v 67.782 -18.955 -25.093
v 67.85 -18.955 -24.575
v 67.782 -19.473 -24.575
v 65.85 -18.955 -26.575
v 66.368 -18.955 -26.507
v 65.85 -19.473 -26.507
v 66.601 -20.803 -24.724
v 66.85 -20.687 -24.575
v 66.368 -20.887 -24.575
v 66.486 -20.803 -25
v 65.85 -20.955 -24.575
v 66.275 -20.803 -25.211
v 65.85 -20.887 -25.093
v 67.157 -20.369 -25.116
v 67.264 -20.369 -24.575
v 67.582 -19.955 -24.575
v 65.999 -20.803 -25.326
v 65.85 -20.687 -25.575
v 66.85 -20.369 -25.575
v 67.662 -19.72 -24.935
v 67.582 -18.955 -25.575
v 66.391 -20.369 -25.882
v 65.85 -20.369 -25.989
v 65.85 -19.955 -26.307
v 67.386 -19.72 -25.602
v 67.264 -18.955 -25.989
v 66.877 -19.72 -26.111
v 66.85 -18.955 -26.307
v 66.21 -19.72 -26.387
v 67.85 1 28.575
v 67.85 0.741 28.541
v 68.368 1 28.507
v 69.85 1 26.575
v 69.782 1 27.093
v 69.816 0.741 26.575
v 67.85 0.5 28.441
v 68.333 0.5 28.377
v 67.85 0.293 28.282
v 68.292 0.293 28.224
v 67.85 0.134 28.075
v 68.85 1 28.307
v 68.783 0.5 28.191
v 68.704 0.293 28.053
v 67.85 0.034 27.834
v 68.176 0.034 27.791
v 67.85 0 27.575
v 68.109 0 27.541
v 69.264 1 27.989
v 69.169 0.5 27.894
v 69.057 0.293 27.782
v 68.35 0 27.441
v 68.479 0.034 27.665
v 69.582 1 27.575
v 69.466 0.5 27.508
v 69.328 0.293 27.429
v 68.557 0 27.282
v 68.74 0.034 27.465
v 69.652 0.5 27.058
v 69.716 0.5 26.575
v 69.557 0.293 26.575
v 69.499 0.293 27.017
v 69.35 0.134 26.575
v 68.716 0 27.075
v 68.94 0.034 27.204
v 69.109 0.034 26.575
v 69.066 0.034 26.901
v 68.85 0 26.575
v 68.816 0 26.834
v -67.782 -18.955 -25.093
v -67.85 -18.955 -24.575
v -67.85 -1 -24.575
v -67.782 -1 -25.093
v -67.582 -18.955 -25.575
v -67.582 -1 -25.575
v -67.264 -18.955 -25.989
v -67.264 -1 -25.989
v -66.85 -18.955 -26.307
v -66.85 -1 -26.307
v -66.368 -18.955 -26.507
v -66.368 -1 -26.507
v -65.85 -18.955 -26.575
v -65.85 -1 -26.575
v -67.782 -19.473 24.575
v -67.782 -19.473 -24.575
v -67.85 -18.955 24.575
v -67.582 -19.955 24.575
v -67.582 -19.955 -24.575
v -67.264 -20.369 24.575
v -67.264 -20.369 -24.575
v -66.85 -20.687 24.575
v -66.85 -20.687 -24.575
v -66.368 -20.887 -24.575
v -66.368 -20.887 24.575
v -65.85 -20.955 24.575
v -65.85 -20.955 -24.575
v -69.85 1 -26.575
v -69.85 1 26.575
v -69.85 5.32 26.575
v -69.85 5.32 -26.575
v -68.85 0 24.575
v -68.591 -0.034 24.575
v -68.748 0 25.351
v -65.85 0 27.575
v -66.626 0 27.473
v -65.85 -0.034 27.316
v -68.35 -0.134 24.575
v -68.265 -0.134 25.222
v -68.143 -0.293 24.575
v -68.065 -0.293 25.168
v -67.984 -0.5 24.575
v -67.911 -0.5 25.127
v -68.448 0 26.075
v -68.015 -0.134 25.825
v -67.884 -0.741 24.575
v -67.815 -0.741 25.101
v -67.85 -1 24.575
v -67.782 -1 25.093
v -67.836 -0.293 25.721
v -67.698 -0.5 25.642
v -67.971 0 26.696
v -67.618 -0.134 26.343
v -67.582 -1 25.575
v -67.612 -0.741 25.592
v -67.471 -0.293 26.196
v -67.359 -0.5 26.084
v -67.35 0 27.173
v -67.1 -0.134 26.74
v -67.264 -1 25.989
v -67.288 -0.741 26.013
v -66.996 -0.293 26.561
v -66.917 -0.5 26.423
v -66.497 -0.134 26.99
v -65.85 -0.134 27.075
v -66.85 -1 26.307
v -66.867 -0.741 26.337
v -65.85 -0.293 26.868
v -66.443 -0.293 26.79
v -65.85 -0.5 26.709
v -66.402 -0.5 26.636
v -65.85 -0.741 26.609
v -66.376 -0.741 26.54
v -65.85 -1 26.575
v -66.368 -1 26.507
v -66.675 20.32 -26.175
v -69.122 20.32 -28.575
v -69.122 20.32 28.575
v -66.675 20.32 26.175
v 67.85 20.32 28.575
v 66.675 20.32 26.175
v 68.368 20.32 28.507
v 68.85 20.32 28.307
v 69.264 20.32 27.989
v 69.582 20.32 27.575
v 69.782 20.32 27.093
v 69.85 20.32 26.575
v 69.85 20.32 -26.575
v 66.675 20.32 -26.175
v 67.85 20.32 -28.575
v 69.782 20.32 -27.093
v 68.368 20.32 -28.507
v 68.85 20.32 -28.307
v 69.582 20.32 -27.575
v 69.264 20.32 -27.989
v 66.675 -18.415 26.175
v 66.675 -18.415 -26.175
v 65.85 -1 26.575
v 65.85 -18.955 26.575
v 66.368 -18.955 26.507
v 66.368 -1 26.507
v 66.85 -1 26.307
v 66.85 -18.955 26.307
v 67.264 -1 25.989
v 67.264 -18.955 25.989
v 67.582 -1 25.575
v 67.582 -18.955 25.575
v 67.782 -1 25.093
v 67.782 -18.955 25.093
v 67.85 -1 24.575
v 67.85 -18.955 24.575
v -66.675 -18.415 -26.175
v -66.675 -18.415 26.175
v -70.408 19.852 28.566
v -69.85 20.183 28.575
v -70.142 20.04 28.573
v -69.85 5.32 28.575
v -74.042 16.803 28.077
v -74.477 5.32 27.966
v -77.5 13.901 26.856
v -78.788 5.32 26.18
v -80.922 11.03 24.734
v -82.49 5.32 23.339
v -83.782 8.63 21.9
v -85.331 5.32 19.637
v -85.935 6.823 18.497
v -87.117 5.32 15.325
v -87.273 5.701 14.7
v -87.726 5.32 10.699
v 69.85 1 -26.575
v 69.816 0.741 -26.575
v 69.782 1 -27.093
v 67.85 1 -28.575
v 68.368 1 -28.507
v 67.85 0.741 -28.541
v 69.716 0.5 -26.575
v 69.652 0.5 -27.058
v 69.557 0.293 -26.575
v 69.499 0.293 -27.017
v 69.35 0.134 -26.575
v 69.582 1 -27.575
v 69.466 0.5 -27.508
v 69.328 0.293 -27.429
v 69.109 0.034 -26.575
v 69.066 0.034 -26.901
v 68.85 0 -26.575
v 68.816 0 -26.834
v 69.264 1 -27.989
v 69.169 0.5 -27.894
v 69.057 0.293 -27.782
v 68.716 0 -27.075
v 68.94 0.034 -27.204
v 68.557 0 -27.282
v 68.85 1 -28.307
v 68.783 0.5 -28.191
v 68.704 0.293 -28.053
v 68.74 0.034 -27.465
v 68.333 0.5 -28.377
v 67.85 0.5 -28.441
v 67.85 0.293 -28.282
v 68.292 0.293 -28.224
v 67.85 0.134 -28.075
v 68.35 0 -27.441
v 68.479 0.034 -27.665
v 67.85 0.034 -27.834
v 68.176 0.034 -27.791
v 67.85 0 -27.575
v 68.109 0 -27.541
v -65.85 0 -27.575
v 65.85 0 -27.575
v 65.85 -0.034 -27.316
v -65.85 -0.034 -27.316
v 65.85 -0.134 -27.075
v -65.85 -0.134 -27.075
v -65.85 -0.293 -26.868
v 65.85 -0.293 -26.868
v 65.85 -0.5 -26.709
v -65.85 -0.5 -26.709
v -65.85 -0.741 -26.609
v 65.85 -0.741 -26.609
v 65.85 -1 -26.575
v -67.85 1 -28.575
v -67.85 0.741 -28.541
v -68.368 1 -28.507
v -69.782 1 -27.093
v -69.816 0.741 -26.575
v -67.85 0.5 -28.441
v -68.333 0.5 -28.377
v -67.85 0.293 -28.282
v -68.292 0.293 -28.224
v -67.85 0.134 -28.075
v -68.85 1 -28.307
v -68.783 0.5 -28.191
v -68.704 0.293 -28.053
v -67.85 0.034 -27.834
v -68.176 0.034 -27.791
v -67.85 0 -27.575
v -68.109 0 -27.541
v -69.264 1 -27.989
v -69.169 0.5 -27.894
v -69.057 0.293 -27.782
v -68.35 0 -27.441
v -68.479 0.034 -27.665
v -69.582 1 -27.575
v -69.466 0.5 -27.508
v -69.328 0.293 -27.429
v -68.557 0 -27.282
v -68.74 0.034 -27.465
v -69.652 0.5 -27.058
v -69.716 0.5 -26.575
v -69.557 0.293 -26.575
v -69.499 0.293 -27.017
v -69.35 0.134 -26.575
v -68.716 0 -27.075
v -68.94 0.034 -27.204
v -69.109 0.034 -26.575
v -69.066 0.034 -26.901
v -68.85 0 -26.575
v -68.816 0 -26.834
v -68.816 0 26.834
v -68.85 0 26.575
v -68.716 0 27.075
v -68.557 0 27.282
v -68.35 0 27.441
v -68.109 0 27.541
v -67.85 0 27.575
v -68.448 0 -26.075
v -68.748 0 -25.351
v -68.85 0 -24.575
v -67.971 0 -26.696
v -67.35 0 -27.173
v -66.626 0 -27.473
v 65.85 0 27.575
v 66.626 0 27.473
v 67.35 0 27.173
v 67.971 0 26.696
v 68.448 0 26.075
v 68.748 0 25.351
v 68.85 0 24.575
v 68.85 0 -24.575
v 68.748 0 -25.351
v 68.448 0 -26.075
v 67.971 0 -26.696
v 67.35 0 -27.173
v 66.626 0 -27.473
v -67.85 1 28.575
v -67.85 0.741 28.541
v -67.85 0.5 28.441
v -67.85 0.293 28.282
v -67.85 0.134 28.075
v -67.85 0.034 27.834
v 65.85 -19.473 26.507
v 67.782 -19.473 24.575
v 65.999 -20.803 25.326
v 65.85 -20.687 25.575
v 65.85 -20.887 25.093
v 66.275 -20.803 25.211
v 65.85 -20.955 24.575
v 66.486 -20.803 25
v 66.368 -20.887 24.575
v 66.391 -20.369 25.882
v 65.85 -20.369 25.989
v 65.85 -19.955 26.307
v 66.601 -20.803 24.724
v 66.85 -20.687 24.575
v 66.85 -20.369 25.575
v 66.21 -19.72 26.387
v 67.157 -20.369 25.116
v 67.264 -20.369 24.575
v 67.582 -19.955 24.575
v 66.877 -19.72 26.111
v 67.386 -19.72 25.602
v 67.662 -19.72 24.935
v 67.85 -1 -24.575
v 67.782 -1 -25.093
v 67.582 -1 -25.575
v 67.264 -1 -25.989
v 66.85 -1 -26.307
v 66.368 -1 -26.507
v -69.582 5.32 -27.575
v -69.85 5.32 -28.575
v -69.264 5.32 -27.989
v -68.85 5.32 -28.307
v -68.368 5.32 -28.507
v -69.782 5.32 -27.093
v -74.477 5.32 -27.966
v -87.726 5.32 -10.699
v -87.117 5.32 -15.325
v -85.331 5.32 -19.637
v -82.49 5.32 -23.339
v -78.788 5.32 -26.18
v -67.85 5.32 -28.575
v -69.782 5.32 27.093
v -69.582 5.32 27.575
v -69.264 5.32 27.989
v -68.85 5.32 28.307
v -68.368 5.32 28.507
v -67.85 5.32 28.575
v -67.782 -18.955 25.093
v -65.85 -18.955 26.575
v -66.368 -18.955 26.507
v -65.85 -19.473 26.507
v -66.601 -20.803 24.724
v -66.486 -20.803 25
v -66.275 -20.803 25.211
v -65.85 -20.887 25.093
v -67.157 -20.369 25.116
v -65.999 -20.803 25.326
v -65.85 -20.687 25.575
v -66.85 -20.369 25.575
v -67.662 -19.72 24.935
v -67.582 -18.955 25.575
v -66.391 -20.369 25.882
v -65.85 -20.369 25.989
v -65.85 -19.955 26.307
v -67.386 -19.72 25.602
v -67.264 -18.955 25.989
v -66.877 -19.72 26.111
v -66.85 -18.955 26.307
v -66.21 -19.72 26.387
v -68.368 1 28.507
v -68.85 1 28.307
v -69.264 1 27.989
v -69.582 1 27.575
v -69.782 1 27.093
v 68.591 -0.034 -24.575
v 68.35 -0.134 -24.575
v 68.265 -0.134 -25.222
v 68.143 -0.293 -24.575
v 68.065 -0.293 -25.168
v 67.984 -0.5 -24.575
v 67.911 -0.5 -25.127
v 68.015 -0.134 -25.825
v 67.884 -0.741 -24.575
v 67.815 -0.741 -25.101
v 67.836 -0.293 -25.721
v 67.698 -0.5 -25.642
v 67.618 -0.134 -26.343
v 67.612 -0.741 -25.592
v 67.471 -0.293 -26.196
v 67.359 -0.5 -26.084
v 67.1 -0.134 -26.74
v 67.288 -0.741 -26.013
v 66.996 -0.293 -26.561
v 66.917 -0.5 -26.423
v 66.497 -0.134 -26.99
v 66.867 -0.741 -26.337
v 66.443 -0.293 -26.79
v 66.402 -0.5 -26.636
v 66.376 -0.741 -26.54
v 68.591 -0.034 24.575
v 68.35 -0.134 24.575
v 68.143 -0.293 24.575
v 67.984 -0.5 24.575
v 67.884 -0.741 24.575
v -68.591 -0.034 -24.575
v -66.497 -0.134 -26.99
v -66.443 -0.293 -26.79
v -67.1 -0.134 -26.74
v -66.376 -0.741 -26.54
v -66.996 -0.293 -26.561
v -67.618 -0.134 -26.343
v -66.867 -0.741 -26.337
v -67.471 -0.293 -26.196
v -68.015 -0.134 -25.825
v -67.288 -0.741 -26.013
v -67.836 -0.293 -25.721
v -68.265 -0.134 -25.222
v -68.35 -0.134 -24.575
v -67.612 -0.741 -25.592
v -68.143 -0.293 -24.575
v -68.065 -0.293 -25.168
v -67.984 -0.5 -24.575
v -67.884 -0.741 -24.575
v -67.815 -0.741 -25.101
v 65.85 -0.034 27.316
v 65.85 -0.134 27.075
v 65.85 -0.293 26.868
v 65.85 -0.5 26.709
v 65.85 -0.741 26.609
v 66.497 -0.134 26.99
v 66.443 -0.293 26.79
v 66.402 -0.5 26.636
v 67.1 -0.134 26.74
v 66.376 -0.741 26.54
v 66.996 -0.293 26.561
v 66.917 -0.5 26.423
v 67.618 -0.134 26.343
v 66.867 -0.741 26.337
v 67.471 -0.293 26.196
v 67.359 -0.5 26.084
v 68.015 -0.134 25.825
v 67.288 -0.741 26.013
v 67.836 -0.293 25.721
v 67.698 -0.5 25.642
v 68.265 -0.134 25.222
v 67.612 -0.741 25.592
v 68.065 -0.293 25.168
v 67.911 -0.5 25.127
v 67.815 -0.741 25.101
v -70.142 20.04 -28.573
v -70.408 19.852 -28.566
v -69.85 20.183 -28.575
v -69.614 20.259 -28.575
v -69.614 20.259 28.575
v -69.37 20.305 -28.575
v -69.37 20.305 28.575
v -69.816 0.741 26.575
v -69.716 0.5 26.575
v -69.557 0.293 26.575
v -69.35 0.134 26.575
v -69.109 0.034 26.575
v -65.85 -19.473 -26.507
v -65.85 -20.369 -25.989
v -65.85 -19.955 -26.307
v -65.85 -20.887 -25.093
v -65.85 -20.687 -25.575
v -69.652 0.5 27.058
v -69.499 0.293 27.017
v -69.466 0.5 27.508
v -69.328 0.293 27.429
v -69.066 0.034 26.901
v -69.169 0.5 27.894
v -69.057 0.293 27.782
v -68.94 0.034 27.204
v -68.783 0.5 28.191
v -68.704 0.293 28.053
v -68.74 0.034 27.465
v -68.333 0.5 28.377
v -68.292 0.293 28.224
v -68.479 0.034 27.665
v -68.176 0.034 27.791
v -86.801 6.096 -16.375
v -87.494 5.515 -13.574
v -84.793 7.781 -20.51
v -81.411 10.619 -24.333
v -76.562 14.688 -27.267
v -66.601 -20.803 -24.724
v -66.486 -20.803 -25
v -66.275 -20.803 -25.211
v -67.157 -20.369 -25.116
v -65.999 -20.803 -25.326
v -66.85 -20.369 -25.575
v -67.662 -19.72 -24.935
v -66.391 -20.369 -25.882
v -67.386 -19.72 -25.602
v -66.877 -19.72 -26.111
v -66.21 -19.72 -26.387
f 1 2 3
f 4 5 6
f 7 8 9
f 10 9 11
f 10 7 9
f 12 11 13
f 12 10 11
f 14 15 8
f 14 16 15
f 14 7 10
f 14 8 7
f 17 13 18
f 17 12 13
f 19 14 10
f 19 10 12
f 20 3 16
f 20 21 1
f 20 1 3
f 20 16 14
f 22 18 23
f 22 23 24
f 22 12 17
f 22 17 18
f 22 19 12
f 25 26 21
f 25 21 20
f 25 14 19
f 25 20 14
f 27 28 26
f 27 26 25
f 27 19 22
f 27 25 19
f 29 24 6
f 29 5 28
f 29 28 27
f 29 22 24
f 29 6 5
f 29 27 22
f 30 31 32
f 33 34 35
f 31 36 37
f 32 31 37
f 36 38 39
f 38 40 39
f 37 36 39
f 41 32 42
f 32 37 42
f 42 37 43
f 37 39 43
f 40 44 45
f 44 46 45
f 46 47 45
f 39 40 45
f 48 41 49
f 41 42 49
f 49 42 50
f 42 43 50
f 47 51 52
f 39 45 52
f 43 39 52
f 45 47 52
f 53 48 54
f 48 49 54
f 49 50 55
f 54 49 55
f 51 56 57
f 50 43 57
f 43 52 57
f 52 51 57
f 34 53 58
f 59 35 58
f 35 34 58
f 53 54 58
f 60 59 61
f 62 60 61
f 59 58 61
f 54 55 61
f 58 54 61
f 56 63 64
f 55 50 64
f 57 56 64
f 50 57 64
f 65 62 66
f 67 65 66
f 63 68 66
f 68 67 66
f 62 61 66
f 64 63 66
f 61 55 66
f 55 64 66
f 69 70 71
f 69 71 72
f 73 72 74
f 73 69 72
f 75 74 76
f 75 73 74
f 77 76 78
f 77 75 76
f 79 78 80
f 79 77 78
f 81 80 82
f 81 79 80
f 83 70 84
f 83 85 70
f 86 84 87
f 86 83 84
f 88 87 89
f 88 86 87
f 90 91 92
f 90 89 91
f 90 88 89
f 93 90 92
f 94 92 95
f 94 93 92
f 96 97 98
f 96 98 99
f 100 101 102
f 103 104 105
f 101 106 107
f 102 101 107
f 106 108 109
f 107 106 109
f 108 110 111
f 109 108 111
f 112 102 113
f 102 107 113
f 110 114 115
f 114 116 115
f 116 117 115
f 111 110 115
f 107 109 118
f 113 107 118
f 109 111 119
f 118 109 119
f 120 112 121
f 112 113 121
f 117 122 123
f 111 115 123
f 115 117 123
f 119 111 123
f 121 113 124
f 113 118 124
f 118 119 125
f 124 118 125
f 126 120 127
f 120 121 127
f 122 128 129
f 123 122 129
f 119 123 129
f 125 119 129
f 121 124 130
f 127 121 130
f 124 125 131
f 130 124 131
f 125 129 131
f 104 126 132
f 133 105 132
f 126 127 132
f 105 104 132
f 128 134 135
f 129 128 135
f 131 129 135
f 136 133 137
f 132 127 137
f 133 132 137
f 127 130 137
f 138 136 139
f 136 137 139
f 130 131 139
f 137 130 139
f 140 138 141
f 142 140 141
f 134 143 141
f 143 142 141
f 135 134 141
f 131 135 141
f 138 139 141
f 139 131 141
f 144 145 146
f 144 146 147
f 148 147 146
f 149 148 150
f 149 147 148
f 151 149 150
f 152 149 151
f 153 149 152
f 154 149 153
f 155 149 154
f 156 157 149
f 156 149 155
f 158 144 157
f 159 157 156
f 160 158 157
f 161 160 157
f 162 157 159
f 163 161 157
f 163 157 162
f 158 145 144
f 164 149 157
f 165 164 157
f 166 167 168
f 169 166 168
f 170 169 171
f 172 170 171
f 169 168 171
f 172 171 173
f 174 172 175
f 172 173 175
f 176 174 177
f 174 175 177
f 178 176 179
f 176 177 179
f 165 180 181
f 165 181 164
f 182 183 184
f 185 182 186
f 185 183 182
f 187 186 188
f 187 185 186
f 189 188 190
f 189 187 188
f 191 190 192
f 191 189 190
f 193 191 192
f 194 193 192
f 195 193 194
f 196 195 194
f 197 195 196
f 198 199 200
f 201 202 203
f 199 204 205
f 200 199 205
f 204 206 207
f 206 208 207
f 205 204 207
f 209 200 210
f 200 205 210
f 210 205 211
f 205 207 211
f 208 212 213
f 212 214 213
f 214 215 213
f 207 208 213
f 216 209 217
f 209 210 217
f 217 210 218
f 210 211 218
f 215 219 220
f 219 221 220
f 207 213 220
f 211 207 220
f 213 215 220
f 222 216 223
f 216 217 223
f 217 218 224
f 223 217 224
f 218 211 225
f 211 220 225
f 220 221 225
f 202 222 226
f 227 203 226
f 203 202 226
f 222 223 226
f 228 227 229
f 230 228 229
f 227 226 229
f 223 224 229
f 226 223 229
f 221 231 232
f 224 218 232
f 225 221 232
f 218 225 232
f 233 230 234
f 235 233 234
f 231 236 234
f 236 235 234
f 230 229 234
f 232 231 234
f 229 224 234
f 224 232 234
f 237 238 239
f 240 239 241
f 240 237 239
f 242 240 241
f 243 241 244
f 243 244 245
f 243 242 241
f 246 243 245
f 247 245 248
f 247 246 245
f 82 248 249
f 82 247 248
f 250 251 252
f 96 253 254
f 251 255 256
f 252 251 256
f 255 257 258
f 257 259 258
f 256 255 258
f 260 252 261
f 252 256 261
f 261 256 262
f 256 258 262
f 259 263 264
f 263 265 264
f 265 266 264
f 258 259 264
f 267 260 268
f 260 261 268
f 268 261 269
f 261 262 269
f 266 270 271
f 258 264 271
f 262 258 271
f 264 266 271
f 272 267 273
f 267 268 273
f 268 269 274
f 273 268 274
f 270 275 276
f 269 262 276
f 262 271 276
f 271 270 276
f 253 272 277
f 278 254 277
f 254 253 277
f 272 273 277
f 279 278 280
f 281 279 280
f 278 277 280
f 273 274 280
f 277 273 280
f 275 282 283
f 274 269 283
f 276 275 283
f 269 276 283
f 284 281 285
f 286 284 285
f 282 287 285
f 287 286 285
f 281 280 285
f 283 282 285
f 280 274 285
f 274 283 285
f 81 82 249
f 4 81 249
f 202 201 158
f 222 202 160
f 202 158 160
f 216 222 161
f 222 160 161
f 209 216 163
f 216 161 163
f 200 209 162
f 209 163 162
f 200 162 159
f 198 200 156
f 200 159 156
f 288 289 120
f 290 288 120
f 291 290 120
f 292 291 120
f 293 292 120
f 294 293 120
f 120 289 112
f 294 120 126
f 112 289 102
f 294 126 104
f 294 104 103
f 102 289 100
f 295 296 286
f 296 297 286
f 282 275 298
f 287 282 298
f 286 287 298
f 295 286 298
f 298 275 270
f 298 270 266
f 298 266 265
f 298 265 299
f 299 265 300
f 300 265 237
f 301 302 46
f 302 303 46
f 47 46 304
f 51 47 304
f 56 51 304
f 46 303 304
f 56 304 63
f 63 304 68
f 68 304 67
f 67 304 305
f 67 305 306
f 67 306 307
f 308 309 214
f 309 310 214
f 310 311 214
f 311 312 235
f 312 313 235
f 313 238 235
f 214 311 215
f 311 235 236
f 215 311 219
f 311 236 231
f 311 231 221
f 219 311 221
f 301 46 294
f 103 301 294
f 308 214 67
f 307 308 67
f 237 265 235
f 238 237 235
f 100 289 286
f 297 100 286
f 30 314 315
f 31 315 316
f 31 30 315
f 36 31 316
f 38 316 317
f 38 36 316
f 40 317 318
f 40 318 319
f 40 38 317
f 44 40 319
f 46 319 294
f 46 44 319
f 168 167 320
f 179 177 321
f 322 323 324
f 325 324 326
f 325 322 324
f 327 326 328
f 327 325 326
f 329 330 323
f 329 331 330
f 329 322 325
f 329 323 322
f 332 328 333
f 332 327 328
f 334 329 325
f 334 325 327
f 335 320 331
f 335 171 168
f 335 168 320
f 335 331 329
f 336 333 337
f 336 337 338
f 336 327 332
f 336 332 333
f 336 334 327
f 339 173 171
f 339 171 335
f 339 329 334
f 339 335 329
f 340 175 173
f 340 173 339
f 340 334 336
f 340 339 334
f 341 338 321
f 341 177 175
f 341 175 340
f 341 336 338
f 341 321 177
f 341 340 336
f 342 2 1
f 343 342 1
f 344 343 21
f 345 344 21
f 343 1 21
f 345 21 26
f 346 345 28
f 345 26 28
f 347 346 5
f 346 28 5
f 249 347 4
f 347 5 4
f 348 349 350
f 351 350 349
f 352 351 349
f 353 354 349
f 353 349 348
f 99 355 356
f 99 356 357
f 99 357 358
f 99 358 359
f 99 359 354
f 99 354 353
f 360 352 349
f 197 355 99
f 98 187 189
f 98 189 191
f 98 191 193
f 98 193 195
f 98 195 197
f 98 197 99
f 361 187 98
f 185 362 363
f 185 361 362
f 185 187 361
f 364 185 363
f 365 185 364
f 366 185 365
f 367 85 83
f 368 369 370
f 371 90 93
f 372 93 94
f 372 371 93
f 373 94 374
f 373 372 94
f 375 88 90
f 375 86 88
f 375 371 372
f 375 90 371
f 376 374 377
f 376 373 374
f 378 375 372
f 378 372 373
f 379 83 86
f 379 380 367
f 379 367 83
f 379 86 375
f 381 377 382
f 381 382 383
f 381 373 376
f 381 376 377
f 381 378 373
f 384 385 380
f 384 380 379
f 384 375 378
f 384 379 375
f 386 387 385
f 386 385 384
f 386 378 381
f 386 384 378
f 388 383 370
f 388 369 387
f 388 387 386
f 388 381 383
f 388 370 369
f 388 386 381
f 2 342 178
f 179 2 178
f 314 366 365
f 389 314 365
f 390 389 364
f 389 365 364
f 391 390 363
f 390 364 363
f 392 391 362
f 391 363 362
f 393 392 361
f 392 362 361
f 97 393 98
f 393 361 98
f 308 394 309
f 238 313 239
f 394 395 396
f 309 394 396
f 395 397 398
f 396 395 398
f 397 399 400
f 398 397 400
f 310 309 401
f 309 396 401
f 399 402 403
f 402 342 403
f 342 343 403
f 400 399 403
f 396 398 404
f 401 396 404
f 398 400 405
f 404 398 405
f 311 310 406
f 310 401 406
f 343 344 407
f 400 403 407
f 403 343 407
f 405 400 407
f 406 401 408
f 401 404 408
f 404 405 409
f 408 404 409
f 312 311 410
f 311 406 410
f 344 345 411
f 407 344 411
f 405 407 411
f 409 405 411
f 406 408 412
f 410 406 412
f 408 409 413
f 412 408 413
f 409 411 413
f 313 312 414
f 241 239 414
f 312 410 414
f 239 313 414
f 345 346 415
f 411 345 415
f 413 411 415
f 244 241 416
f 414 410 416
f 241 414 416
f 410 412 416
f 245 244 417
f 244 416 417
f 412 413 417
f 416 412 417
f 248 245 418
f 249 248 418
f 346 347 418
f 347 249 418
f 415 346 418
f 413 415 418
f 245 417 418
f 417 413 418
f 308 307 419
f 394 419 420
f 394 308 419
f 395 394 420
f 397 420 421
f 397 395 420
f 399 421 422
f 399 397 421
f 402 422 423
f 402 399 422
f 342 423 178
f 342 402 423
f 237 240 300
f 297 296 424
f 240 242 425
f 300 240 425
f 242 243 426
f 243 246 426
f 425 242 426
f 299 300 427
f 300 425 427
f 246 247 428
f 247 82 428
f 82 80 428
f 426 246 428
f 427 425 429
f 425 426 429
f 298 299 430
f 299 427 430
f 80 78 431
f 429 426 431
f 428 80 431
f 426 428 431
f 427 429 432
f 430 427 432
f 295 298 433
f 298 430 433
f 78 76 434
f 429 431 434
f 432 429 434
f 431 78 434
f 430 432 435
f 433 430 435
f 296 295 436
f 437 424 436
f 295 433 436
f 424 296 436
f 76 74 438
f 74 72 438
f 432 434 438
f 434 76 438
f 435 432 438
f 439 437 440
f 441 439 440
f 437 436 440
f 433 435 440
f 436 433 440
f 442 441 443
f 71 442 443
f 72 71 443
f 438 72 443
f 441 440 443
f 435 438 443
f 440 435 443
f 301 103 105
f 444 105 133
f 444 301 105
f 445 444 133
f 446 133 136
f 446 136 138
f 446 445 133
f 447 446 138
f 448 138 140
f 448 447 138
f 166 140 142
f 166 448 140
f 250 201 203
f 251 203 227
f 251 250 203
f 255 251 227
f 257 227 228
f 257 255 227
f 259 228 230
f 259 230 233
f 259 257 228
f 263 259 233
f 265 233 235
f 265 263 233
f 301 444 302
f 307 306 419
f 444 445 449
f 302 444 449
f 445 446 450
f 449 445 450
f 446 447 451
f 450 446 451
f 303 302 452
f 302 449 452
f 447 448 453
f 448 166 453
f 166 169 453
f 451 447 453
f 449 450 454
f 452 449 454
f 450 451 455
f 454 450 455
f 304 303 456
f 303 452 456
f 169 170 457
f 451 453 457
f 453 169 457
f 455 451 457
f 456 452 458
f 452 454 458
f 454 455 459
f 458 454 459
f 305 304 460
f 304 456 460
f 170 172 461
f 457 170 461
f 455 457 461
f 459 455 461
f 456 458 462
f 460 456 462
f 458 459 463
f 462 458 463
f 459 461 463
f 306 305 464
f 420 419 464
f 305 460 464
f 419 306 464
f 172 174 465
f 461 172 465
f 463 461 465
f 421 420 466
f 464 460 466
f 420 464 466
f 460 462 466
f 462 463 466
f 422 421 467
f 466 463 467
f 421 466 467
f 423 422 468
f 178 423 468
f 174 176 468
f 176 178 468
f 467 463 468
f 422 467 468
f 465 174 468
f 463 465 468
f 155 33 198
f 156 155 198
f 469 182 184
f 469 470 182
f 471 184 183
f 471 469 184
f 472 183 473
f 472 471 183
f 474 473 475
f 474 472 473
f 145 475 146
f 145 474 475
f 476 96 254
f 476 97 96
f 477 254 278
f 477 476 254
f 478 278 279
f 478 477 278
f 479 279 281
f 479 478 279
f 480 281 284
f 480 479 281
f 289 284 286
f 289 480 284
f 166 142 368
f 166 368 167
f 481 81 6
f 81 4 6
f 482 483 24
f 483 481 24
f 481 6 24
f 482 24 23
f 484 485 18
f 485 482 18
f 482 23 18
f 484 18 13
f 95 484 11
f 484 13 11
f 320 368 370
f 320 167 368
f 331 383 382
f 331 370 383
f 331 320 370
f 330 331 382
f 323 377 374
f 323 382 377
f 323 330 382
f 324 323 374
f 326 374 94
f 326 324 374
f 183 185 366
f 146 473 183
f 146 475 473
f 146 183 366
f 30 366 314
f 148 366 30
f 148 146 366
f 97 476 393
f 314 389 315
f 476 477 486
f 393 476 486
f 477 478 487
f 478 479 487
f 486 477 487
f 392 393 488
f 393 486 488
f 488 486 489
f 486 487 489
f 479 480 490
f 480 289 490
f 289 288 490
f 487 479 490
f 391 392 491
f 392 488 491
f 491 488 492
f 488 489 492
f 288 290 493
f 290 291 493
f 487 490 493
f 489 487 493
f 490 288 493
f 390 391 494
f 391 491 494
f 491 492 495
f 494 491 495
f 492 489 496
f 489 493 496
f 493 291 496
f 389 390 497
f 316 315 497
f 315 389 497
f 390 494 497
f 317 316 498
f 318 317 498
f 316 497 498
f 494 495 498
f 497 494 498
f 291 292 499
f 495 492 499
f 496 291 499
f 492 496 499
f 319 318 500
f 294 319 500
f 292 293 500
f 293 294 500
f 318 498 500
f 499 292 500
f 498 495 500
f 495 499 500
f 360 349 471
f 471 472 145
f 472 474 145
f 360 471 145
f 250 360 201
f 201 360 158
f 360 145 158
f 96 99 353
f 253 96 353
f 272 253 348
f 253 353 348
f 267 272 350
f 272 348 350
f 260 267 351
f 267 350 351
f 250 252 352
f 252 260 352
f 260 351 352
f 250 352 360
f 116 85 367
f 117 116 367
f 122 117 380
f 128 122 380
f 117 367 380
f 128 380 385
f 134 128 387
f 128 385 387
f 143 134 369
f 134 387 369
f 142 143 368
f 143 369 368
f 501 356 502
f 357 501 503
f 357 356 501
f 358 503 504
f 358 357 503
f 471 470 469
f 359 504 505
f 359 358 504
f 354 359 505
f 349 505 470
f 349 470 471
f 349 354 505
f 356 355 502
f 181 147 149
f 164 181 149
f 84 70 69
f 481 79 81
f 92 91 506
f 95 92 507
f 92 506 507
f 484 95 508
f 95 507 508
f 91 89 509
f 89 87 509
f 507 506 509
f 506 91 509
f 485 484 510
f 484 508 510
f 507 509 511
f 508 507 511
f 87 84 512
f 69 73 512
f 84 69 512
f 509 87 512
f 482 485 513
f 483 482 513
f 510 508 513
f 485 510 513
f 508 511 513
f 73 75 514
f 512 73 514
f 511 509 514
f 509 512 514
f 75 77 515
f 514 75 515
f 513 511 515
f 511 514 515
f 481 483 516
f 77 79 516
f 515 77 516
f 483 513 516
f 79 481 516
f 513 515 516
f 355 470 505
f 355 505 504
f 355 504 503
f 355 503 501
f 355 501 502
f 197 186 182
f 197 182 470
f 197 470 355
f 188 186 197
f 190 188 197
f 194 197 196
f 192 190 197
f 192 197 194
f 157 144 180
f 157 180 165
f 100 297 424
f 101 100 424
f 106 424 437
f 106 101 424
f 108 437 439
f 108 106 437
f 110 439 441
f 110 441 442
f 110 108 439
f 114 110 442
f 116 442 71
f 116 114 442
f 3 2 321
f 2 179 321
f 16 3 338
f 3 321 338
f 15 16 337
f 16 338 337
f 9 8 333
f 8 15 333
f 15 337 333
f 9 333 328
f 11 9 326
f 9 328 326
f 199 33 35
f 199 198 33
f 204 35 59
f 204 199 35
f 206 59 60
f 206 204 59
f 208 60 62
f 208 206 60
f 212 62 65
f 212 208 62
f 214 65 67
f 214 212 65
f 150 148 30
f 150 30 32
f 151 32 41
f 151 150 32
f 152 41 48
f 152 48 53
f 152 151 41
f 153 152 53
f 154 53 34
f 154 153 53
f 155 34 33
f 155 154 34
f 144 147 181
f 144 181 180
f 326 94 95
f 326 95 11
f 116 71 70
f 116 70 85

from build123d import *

# Parameters (mm, degrees)
SKETCH1_W           = 139.7
SKETCH1_H           = 57.15
BOSS_EXTRUDE1_DEPTH = 20.32
SKETCH2_W           = 135.7
SKETCH2_H           = 53.15
BOSS_EXTRUDE2_DEPTH = 20.955
BOSS_EXTRUDE3_DEPTH = 57.15
CUT_EXTRUDE1_DEPTH  = 96.931280842
FILLET1_R           = 2
FILLET2_R           = 1
SKETCH5_W           = 133.35
SKETCH5_H           = 52.35
CUT_EXTRUDE2_DEPTH  = 38.735


with BuildPart() as part:
    # Sketch1 → Boss-Extrude1 (new body)
    with BuildSketch(Plane(origin=(0, 0, 0), x_dir=(1, 0, 0), z_dir=(0, 1, 0))):
        Rectangle(SKETCH1_W, SKETCH1_H)
    extrude(amount=BOSS_EXTRUDE1_DEPTH)

    # Sketch2 → Boss-Extrude2 (add)
    with BuildSketch(Plane.XZ):
        Rectangle(SKETCH2_W, SKETCH2_H)
    extrude(amount=BOSS_EXTRUDE2_DEPTH)

    # Sketch3 → Boss-Extrude3 (add, through all)
    with BuildSketch(Plane.XY.offset(28.575)):
        Polygon((-69.85, 20.32), (-87.726303889, 5.32), (-69.85, 5.32), align=None)
    extrude(amount=-BOSS_EXTRUDE3_DEPTH)

    # Sketch4 → Cut-Extrude1 (cut, through all)
    with BuildSketch(Plane.XZ.offset(-5.32)):
        with BuildLine():
            Line((-69.85, -28.575), (-87.726303889, -28.575))
            Line((-87.726303889, -28.575), (-87.726303889, -10.698696111))
            ThreePointArc((-87.726303889, -10.698696111), (-82.490455702, -23.339151813), (-69.85, -28.575))
        make_face()
        with BuildLine():
            Line((-87.726303889, 10.698696111), (-87.726303889, 28.575))
            Line((-87.726303889, 28.575), (-69.85, 28.575))
            ThreePointArc((-69.85, 28.575), (-82.490455702, 23.339151813), (-87.726303889, 10.698696111))
        make_face()
    extrude(amount=-CUT_EXTRUDE1_DEPTH, mode=Mode.SUBTRACT)

    # Fillet1
    fillet1_edges = [part.edges().sort_by_distance(p)[0] for p in [
        (-69.85, 20.32, 0),
        (-69.85, 2.66, -28.575),
        (-67.85, -10.4775, -26.575),
        (69.85, 10.16, -28.575),
        (67.85, -10.4775, -26.575),
        (69.85, 10.16, 28.575),
        (67.85, -10.4775, 26.575),
        (-67.85, -10.4775, 26.575),
        (-69.85, 2.66, 28.575),
        (-67.85, -20.955, 0),
        (0, -20.955, 26.575),
        (67.85, -20.955, 0),
        (0, -20.955, -26.575),
    ]]
    fillet(fillet1_edges, radius=FILLET1_R)

    # Fillet2
    fillet2_edges = [part.edges().sort_by_distance(p)[0] for p in [
        (0, 0, 28.575),
        (0, 0, -28.575),
        (-67.85, 0, 0),
        (0, 0, 26.575),
        (67.85, 0, 0),
        (0, 0, -26.575),
        (-69.85, 0, 0),
        (69.85, 0, 0),
        (-69.264213562, 0, 27.989213562),
        (69.264213562, 0, 27.989213562),
        (69.264213562, 0, -27.989213562),
        (-69.264213562, 0, -27.989213562),
        (-67.264213562, 0, -25.989213562),
        (67.264213562, 0, -25.989213562),
        (67.264213562, 0, 25.989213562),
        (-67.264213562, 0, 25.989213562),
    ]]
    fillet(fillet2_edges, radius=FILLET2_R - 0.0001)  # a hair under: the kernel refuses the full size

    # Sketch5 → Cut-Extrude2 (cut)
    with BuildSketch(Plane(origin=(0, 20.32, 0), x_dir=(1, 0, 0), z_dir=(0, 1, 0))):
        Rectangle(SKETCH5_W, SKETCH5_H)
    extrude(amount=-CUT_EXTRUDE2_DEPTH, mode=Mode.SUBTRACT)


solid = part.part
